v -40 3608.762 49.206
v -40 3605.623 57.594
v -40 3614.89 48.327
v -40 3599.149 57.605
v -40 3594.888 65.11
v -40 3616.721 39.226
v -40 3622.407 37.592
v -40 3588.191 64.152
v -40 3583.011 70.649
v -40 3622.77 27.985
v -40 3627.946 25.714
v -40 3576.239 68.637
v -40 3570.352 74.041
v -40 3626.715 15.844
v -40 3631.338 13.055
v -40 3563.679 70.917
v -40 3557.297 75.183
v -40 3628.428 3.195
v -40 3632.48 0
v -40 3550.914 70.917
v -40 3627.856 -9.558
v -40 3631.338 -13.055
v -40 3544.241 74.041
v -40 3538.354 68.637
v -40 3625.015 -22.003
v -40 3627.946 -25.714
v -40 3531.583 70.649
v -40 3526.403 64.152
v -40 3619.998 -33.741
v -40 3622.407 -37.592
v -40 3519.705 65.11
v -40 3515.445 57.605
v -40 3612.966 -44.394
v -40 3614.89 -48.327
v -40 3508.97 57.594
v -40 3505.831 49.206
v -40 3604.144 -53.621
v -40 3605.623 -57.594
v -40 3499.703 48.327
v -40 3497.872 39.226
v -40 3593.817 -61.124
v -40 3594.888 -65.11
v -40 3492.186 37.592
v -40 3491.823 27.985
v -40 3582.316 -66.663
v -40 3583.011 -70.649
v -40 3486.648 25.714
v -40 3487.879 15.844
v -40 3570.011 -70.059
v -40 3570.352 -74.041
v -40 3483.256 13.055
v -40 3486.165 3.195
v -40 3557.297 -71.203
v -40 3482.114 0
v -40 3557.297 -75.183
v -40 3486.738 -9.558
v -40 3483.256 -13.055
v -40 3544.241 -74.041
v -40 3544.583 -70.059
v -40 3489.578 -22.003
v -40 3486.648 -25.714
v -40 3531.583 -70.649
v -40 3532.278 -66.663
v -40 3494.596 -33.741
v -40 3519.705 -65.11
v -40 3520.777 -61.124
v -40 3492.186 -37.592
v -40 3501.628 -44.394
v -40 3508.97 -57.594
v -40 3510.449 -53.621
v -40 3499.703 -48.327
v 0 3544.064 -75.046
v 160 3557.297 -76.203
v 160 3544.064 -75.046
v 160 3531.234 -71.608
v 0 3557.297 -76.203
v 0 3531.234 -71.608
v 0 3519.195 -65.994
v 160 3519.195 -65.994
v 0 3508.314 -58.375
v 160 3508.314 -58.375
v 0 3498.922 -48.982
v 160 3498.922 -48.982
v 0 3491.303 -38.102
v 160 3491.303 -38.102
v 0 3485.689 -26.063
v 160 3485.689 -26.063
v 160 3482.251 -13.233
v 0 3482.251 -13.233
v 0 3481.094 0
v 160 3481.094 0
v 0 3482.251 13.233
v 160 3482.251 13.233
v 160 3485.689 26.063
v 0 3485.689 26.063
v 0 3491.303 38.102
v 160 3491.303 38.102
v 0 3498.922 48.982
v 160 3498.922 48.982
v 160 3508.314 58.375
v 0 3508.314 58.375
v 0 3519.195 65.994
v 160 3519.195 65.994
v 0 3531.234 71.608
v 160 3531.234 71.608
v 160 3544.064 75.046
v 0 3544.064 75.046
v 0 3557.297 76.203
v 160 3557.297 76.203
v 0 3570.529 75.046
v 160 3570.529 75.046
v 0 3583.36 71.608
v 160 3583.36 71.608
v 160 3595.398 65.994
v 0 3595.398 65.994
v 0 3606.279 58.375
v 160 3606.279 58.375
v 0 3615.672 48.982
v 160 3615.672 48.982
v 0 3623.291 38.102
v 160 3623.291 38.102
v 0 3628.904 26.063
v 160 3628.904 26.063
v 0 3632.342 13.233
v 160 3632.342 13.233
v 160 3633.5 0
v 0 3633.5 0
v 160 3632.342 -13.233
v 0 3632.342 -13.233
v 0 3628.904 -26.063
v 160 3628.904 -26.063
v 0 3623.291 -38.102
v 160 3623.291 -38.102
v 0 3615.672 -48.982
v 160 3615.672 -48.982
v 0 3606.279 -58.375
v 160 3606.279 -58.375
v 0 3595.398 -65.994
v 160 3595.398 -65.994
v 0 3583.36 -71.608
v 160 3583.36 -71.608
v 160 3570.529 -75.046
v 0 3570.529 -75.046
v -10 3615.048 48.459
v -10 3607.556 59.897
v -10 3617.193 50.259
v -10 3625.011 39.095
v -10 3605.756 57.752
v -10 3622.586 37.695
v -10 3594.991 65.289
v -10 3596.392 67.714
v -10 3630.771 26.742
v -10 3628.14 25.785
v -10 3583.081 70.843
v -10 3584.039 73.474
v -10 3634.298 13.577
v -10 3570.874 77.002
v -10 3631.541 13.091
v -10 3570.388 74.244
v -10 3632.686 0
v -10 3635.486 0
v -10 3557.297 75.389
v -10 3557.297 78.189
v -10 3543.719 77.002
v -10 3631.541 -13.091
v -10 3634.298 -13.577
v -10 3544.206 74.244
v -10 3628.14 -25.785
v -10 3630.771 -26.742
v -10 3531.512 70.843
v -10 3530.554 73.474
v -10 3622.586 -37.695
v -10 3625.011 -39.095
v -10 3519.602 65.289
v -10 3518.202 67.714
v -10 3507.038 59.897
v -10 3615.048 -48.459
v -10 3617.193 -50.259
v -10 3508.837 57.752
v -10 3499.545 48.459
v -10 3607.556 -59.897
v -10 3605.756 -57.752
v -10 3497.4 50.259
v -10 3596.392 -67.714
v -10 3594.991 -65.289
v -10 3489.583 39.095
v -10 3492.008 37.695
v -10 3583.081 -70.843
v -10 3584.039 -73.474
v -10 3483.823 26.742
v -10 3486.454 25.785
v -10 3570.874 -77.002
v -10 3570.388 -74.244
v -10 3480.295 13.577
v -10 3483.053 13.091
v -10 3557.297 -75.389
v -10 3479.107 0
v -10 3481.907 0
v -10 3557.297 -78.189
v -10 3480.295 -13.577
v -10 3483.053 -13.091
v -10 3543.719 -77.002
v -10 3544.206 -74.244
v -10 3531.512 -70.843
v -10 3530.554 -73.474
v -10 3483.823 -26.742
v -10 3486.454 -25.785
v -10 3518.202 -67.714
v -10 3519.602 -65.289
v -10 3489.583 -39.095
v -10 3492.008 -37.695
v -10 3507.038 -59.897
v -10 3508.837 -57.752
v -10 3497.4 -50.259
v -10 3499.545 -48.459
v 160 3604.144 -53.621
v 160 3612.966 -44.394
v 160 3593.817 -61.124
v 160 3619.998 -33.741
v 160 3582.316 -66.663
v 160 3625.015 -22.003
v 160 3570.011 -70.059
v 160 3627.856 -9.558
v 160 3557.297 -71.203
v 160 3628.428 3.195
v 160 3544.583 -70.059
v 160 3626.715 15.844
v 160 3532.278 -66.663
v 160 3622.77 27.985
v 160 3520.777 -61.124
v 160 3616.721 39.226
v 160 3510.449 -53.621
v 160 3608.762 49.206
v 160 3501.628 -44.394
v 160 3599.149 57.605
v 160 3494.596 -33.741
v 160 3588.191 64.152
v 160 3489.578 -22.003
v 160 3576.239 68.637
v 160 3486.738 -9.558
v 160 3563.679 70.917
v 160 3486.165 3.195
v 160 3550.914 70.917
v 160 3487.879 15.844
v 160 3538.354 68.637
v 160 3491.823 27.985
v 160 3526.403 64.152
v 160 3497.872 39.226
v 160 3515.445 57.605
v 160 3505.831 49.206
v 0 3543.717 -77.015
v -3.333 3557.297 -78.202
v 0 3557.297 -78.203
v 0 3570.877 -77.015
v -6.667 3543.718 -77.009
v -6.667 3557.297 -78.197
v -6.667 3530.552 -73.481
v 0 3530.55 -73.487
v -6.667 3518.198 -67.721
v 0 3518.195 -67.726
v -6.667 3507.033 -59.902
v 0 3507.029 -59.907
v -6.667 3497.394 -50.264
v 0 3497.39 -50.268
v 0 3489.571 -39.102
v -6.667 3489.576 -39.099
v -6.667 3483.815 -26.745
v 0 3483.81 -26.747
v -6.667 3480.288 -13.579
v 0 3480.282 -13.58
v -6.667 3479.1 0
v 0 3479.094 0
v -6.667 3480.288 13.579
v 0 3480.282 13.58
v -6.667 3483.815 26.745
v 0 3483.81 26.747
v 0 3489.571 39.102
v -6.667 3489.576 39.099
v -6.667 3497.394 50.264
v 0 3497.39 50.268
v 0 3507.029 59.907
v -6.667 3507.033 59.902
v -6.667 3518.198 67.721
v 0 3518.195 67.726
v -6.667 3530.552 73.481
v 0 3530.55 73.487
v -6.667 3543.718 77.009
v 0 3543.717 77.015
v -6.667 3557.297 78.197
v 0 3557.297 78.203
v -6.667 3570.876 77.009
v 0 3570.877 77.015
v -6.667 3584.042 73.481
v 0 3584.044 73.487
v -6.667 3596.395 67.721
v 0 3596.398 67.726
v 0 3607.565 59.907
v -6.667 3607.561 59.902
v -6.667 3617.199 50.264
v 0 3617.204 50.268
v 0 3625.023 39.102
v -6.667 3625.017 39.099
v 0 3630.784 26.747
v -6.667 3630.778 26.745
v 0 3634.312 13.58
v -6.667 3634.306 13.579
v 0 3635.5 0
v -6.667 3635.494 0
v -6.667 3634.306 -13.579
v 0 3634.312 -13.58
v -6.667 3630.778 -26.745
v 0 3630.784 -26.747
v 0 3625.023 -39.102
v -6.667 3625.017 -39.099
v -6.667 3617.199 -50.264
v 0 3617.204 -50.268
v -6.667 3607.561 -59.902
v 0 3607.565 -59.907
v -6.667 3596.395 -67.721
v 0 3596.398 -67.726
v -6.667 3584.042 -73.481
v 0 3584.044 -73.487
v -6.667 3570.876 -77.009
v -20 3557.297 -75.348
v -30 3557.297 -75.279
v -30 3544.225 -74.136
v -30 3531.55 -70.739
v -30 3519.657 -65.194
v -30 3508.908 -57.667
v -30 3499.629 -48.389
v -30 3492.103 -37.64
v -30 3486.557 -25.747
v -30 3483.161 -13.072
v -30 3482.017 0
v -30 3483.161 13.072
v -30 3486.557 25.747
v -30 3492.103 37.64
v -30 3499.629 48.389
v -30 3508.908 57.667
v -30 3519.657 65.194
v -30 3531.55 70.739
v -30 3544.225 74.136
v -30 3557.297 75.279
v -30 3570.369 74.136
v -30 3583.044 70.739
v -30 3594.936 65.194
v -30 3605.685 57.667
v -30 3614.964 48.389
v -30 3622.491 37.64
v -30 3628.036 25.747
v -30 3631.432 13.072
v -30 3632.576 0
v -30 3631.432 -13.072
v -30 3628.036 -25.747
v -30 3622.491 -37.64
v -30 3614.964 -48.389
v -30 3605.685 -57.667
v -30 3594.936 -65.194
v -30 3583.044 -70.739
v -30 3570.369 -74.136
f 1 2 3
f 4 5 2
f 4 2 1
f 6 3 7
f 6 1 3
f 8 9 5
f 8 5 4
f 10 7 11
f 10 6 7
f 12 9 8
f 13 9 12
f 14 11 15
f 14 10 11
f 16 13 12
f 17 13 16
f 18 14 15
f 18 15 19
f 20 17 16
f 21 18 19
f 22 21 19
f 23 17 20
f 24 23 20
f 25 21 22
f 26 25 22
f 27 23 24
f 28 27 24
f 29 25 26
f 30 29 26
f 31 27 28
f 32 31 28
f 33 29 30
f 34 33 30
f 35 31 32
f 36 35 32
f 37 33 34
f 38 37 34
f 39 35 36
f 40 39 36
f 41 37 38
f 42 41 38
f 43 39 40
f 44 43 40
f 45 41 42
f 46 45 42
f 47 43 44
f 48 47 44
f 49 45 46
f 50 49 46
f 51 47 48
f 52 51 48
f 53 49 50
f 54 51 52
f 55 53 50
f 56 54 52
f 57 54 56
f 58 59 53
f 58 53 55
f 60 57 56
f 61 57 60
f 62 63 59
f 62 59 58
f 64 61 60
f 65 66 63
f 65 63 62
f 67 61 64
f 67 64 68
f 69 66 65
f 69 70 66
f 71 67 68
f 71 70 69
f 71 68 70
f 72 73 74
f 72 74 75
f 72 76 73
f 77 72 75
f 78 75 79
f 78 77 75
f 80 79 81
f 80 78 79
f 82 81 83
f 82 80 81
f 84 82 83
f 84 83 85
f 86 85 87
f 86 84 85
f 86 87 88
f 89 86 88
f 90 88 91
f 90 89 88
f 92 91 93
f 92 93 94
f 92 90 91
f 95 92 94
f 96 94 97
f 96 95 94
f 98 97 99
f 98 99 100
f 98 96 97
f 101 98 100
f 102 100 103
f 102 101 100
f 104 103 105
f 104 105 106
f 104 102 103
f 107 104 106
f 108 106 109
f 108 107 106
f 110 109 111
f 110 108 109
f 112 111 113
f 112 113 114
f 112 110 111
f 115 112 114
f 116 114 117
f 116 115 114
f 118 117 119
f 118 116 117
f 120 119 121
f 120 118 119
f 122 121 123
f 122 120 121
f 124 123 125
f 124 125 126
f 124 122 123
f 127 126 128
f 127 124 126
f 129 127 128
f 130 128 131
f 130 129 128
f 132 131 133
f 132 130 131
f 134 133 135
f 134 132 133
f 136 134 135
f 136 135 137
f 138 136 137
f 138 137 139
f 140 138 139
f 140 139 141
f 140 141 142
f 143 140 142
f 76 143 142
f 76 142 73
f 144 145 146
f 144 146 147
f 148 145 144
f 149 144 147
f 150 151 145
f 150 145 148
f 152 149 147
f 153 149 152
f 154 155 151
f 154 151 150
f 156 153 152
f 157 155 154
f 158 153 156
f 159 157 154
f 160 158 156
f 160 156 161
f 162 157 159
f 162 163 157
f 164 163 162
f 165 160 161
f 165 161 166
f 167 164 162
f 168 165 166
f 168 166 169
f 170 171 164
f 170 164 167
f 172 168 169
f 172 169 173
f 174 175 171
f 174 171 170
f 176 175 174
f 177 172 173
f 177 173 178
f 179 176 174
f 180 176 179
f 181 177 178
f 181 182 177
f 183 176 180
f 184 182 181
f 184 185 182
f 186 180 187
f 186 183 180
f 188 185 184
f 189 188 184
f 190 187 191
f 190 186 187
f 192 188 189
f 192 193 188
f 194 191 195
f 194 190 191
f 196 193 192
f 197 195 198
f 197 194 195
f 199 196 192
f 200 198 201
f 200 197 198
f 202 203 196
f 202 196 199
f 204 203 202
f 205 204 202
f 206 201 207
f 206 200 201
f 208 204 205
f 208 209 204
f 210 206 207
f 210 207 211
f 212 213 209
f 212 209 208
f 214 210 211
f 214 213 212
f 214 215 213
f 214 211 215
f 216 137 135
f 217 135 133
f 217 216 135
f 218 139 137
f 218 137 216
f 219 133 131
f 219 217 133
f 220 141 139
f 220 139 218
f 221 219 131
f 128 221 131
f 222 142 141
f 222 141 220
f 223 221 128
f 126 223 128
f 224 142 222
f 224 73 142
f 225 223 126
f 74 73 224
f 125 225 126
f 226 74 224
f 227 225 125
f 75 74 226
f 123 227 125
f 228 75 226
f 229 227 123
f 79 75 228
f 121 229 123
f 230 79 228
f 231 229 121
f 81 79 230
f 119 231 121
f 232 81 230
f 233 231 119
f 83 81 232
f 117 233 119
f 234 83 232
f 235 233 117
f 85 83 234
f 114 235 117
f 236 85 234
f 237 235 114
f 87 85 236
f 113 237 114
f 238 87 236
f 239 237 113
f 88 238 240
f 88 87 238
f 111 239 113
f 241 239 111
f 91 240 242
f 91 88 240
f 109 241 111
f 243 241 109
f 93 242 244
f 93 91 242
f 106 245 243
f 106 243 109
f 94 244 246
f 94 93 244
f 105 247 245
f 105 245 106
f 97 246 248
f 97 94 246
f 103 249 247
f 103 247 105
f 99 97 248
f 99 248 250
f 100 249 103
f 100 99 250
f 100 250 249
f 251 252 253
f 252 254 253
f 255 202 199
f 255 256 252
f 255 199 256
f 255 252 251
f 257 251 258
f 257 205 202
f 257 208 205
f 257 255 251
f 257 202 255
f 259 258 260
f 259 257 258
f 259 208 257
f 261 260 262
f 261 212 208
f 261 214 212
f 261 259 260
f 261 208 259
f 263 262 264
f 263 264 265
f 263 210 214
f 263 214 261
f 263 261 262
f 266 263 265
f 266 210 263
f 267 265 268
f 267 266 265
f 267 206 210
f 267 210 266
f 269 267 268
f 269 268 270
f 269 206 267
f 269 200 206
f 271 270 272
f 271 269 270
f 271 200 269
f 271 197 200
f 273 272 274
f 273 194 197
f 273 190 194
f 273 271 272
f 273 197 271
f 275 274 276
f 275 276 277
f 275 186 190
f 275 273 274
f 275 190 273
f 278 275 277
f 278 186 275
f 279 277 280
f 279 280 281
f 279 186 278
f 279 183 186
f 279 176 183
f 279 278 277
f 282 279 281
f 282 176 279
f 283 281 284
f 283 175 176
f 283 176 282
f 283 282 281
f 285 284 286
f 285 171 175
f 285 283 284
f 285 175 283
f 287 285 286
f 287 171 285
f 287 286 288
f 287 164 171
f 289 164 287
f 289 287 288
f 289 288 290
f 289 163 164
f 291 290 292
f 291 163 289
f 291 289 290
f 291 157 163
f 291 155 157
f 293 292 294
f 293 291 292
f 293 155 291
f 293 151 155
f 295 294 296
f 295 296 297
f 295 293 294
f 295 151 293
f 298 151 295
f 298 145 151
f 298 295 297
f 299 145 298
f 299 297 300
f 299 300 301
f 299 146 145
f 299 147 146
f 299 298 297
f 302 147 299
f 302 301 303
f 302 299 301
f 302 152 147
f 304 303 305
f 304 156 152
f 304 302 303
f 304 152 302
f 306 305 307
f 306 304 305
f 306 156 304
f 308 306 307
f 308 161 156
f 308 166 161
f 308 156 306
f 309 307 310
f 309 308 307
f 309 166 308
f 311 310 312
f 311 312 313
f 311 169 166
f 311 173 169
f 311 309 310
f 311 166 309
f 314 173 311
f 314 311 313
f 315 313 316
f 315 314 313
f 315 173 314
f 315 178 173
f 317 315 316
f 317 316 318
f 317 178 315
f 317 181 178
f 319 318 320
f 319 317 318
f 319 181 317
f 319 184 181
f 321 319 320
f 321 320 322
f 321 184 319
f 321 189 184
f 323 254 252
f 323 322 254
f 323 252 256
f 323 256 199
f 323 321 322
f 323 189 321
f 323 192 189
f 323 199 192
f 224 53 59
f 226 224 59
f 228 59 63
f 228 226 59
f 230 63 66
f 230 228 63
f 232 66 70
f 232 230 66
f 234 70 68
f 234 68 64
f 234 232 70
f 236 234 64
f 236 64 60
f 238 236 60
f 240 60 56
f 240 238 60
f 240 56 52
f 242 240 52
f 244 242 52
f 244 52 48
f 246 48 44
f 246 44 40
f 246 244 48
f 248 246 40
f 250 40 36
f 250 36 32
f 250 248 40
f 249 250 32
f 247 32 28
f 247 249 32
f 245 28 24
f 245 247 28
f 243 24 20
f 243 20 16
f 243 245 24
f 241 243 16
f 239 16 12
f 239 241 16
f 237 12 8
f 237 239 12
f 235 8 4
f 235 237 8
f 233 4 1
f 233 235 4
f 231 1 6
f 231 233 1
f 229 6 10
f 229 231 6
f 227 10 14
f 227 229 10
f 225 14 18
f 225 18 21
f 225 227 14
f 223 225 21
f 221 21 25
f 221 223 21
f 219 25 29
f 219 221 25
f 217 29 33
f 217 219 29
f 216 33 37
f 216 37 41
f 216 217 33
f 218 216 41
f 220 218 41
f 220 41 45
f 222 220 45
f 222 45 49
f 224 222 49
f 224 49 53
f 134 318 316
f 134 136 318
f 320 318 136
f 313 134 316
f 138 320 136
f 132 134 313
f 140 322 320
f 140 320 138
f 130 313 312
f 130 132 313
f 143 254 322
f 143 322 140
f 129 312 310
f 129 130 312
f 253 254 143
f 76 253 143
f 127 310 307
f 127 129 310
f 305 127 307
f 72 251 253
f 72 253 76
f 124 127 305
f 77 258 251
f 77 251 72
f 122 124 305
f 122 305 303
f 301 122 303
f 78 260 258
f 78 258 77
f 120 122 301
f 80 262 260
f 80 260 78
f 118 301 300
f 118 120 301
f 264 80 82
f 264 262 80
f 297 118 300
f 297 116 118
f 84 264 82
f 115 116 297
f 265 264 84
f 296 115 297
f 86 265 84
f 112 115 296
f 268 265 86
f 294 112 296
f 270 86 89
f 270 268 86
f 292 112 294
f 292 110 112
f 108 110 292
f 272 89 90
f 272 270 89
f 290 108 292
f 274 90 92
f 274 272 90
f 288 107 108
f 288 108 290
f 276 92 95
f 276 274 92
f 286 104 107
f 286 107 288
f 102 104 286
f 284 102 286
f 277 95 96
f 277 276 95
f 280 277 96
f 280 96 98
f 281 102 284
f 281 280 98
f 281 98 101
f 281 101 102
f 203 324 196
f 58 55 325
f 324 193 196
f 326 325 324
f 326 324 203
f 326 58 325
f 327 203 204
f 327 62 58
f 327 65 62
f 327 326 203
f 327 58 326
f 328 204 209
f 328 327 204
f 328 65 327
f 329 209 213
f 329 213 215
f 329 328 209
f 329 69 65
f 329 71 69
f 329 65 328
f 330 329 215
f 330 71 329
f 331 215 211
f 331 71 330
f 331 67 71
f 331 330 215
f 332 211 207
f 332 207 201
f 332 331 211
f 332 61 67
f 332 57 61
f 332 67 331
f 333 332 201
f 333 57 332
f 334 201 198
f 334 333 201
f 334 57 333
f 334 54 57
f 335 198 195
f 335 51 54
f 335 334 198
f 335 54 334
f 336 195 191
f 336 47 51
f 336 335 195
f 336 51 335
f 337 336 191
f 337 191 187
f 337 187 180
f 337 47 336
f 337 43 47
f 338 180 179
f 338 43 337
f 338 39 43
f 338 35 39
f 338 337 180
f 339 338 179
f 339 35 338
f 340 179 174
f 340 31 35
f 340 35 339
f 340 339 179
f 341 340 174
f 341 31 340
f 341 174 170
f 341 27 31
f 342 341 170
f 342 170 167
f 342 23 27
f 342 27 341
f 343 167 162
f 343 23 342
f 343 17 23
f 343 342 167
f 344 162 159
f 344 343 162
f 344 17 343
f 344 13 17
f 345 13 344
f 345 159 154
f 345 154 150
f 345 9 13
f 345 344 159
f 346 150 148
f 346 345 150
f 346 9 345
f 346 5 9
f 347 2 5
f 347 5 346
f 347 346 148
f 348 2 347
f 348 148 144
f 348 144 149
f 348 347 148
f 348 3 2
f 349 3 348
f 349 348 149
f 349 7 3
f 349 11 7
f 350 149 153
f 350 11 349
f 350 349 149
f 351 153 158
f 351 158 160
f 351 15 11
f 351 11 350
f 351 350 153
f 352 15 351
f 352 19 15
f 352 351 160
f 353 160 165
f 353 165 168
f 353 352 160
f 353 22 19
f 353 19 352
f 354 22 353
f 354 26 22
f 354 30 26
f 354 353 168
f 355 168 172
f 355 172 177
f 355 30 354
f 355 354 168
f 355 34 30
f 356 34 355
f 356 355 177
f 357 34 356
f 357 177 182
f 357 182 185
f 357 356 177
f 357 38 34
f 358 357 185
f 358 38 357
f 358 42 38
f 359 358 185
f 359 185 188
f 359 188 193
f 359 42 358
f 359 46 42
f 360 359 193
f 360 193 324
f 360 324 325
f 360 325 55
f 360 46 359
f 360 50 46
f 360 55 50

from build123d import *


with BuildPart() as part:
    # Sketch1 → Revolve1 (revolve)
    with BuildSketch(Plane.XY, mode=Mode.PRIVATE) as revolve1_sk:
        with BuildLine():
            Line((0, 3633.5), (0, 3635.5))
            ThreePointArc((0, 3635.5), (-5.000004729, 3635.496561675), (-10, 3635.486246708))
            Line((-10, 3635.486246708), (-10, 3632.986237243))
            Line((-10, 3632.986237243), (-10, 3632.686236107))
            ThreePointArc((-10, 3632.686236107), (-25.000213137, 3632.613973345), (-40, 3632.479771451))
            Line((-40, 3632.479771451), (-40, 3630.279637989))
            ThreePointArc((-40, 3630.279637989), (-22.500261409, 3630.430275909), (-5, 3630.496556946))
            Line((-5, 3630.496556946), (-5, 3628.5))
            Line((-5, 3628.5), (160, 3628.5))
            Line((160, 3628.5), (160, 3633.5))
            Line((160, 3633.5), (0, 3633.5))
        make_face()
        with BuildLine():
            Line((-40, 3628.5), (-5, 3628.5))
            Line((-5, 3628.5), (-5, 3630.496556946))
            ThreePointArc((-5, 3630.496556946), (-22.500261409, 3630.430275909), (-40, 3630.279637989))
            Line((-40, 3630.279637989), (-40, 3628.5))
        make_face()
    revolve(revolve1_sk.sketch.rotate(Axis((0, 3557.296761587, 0), (-1, 0, 0)), 90), axis=Axis((0, 3557.296761587, 0), (-1, 0, 0)))


solid = part.part
